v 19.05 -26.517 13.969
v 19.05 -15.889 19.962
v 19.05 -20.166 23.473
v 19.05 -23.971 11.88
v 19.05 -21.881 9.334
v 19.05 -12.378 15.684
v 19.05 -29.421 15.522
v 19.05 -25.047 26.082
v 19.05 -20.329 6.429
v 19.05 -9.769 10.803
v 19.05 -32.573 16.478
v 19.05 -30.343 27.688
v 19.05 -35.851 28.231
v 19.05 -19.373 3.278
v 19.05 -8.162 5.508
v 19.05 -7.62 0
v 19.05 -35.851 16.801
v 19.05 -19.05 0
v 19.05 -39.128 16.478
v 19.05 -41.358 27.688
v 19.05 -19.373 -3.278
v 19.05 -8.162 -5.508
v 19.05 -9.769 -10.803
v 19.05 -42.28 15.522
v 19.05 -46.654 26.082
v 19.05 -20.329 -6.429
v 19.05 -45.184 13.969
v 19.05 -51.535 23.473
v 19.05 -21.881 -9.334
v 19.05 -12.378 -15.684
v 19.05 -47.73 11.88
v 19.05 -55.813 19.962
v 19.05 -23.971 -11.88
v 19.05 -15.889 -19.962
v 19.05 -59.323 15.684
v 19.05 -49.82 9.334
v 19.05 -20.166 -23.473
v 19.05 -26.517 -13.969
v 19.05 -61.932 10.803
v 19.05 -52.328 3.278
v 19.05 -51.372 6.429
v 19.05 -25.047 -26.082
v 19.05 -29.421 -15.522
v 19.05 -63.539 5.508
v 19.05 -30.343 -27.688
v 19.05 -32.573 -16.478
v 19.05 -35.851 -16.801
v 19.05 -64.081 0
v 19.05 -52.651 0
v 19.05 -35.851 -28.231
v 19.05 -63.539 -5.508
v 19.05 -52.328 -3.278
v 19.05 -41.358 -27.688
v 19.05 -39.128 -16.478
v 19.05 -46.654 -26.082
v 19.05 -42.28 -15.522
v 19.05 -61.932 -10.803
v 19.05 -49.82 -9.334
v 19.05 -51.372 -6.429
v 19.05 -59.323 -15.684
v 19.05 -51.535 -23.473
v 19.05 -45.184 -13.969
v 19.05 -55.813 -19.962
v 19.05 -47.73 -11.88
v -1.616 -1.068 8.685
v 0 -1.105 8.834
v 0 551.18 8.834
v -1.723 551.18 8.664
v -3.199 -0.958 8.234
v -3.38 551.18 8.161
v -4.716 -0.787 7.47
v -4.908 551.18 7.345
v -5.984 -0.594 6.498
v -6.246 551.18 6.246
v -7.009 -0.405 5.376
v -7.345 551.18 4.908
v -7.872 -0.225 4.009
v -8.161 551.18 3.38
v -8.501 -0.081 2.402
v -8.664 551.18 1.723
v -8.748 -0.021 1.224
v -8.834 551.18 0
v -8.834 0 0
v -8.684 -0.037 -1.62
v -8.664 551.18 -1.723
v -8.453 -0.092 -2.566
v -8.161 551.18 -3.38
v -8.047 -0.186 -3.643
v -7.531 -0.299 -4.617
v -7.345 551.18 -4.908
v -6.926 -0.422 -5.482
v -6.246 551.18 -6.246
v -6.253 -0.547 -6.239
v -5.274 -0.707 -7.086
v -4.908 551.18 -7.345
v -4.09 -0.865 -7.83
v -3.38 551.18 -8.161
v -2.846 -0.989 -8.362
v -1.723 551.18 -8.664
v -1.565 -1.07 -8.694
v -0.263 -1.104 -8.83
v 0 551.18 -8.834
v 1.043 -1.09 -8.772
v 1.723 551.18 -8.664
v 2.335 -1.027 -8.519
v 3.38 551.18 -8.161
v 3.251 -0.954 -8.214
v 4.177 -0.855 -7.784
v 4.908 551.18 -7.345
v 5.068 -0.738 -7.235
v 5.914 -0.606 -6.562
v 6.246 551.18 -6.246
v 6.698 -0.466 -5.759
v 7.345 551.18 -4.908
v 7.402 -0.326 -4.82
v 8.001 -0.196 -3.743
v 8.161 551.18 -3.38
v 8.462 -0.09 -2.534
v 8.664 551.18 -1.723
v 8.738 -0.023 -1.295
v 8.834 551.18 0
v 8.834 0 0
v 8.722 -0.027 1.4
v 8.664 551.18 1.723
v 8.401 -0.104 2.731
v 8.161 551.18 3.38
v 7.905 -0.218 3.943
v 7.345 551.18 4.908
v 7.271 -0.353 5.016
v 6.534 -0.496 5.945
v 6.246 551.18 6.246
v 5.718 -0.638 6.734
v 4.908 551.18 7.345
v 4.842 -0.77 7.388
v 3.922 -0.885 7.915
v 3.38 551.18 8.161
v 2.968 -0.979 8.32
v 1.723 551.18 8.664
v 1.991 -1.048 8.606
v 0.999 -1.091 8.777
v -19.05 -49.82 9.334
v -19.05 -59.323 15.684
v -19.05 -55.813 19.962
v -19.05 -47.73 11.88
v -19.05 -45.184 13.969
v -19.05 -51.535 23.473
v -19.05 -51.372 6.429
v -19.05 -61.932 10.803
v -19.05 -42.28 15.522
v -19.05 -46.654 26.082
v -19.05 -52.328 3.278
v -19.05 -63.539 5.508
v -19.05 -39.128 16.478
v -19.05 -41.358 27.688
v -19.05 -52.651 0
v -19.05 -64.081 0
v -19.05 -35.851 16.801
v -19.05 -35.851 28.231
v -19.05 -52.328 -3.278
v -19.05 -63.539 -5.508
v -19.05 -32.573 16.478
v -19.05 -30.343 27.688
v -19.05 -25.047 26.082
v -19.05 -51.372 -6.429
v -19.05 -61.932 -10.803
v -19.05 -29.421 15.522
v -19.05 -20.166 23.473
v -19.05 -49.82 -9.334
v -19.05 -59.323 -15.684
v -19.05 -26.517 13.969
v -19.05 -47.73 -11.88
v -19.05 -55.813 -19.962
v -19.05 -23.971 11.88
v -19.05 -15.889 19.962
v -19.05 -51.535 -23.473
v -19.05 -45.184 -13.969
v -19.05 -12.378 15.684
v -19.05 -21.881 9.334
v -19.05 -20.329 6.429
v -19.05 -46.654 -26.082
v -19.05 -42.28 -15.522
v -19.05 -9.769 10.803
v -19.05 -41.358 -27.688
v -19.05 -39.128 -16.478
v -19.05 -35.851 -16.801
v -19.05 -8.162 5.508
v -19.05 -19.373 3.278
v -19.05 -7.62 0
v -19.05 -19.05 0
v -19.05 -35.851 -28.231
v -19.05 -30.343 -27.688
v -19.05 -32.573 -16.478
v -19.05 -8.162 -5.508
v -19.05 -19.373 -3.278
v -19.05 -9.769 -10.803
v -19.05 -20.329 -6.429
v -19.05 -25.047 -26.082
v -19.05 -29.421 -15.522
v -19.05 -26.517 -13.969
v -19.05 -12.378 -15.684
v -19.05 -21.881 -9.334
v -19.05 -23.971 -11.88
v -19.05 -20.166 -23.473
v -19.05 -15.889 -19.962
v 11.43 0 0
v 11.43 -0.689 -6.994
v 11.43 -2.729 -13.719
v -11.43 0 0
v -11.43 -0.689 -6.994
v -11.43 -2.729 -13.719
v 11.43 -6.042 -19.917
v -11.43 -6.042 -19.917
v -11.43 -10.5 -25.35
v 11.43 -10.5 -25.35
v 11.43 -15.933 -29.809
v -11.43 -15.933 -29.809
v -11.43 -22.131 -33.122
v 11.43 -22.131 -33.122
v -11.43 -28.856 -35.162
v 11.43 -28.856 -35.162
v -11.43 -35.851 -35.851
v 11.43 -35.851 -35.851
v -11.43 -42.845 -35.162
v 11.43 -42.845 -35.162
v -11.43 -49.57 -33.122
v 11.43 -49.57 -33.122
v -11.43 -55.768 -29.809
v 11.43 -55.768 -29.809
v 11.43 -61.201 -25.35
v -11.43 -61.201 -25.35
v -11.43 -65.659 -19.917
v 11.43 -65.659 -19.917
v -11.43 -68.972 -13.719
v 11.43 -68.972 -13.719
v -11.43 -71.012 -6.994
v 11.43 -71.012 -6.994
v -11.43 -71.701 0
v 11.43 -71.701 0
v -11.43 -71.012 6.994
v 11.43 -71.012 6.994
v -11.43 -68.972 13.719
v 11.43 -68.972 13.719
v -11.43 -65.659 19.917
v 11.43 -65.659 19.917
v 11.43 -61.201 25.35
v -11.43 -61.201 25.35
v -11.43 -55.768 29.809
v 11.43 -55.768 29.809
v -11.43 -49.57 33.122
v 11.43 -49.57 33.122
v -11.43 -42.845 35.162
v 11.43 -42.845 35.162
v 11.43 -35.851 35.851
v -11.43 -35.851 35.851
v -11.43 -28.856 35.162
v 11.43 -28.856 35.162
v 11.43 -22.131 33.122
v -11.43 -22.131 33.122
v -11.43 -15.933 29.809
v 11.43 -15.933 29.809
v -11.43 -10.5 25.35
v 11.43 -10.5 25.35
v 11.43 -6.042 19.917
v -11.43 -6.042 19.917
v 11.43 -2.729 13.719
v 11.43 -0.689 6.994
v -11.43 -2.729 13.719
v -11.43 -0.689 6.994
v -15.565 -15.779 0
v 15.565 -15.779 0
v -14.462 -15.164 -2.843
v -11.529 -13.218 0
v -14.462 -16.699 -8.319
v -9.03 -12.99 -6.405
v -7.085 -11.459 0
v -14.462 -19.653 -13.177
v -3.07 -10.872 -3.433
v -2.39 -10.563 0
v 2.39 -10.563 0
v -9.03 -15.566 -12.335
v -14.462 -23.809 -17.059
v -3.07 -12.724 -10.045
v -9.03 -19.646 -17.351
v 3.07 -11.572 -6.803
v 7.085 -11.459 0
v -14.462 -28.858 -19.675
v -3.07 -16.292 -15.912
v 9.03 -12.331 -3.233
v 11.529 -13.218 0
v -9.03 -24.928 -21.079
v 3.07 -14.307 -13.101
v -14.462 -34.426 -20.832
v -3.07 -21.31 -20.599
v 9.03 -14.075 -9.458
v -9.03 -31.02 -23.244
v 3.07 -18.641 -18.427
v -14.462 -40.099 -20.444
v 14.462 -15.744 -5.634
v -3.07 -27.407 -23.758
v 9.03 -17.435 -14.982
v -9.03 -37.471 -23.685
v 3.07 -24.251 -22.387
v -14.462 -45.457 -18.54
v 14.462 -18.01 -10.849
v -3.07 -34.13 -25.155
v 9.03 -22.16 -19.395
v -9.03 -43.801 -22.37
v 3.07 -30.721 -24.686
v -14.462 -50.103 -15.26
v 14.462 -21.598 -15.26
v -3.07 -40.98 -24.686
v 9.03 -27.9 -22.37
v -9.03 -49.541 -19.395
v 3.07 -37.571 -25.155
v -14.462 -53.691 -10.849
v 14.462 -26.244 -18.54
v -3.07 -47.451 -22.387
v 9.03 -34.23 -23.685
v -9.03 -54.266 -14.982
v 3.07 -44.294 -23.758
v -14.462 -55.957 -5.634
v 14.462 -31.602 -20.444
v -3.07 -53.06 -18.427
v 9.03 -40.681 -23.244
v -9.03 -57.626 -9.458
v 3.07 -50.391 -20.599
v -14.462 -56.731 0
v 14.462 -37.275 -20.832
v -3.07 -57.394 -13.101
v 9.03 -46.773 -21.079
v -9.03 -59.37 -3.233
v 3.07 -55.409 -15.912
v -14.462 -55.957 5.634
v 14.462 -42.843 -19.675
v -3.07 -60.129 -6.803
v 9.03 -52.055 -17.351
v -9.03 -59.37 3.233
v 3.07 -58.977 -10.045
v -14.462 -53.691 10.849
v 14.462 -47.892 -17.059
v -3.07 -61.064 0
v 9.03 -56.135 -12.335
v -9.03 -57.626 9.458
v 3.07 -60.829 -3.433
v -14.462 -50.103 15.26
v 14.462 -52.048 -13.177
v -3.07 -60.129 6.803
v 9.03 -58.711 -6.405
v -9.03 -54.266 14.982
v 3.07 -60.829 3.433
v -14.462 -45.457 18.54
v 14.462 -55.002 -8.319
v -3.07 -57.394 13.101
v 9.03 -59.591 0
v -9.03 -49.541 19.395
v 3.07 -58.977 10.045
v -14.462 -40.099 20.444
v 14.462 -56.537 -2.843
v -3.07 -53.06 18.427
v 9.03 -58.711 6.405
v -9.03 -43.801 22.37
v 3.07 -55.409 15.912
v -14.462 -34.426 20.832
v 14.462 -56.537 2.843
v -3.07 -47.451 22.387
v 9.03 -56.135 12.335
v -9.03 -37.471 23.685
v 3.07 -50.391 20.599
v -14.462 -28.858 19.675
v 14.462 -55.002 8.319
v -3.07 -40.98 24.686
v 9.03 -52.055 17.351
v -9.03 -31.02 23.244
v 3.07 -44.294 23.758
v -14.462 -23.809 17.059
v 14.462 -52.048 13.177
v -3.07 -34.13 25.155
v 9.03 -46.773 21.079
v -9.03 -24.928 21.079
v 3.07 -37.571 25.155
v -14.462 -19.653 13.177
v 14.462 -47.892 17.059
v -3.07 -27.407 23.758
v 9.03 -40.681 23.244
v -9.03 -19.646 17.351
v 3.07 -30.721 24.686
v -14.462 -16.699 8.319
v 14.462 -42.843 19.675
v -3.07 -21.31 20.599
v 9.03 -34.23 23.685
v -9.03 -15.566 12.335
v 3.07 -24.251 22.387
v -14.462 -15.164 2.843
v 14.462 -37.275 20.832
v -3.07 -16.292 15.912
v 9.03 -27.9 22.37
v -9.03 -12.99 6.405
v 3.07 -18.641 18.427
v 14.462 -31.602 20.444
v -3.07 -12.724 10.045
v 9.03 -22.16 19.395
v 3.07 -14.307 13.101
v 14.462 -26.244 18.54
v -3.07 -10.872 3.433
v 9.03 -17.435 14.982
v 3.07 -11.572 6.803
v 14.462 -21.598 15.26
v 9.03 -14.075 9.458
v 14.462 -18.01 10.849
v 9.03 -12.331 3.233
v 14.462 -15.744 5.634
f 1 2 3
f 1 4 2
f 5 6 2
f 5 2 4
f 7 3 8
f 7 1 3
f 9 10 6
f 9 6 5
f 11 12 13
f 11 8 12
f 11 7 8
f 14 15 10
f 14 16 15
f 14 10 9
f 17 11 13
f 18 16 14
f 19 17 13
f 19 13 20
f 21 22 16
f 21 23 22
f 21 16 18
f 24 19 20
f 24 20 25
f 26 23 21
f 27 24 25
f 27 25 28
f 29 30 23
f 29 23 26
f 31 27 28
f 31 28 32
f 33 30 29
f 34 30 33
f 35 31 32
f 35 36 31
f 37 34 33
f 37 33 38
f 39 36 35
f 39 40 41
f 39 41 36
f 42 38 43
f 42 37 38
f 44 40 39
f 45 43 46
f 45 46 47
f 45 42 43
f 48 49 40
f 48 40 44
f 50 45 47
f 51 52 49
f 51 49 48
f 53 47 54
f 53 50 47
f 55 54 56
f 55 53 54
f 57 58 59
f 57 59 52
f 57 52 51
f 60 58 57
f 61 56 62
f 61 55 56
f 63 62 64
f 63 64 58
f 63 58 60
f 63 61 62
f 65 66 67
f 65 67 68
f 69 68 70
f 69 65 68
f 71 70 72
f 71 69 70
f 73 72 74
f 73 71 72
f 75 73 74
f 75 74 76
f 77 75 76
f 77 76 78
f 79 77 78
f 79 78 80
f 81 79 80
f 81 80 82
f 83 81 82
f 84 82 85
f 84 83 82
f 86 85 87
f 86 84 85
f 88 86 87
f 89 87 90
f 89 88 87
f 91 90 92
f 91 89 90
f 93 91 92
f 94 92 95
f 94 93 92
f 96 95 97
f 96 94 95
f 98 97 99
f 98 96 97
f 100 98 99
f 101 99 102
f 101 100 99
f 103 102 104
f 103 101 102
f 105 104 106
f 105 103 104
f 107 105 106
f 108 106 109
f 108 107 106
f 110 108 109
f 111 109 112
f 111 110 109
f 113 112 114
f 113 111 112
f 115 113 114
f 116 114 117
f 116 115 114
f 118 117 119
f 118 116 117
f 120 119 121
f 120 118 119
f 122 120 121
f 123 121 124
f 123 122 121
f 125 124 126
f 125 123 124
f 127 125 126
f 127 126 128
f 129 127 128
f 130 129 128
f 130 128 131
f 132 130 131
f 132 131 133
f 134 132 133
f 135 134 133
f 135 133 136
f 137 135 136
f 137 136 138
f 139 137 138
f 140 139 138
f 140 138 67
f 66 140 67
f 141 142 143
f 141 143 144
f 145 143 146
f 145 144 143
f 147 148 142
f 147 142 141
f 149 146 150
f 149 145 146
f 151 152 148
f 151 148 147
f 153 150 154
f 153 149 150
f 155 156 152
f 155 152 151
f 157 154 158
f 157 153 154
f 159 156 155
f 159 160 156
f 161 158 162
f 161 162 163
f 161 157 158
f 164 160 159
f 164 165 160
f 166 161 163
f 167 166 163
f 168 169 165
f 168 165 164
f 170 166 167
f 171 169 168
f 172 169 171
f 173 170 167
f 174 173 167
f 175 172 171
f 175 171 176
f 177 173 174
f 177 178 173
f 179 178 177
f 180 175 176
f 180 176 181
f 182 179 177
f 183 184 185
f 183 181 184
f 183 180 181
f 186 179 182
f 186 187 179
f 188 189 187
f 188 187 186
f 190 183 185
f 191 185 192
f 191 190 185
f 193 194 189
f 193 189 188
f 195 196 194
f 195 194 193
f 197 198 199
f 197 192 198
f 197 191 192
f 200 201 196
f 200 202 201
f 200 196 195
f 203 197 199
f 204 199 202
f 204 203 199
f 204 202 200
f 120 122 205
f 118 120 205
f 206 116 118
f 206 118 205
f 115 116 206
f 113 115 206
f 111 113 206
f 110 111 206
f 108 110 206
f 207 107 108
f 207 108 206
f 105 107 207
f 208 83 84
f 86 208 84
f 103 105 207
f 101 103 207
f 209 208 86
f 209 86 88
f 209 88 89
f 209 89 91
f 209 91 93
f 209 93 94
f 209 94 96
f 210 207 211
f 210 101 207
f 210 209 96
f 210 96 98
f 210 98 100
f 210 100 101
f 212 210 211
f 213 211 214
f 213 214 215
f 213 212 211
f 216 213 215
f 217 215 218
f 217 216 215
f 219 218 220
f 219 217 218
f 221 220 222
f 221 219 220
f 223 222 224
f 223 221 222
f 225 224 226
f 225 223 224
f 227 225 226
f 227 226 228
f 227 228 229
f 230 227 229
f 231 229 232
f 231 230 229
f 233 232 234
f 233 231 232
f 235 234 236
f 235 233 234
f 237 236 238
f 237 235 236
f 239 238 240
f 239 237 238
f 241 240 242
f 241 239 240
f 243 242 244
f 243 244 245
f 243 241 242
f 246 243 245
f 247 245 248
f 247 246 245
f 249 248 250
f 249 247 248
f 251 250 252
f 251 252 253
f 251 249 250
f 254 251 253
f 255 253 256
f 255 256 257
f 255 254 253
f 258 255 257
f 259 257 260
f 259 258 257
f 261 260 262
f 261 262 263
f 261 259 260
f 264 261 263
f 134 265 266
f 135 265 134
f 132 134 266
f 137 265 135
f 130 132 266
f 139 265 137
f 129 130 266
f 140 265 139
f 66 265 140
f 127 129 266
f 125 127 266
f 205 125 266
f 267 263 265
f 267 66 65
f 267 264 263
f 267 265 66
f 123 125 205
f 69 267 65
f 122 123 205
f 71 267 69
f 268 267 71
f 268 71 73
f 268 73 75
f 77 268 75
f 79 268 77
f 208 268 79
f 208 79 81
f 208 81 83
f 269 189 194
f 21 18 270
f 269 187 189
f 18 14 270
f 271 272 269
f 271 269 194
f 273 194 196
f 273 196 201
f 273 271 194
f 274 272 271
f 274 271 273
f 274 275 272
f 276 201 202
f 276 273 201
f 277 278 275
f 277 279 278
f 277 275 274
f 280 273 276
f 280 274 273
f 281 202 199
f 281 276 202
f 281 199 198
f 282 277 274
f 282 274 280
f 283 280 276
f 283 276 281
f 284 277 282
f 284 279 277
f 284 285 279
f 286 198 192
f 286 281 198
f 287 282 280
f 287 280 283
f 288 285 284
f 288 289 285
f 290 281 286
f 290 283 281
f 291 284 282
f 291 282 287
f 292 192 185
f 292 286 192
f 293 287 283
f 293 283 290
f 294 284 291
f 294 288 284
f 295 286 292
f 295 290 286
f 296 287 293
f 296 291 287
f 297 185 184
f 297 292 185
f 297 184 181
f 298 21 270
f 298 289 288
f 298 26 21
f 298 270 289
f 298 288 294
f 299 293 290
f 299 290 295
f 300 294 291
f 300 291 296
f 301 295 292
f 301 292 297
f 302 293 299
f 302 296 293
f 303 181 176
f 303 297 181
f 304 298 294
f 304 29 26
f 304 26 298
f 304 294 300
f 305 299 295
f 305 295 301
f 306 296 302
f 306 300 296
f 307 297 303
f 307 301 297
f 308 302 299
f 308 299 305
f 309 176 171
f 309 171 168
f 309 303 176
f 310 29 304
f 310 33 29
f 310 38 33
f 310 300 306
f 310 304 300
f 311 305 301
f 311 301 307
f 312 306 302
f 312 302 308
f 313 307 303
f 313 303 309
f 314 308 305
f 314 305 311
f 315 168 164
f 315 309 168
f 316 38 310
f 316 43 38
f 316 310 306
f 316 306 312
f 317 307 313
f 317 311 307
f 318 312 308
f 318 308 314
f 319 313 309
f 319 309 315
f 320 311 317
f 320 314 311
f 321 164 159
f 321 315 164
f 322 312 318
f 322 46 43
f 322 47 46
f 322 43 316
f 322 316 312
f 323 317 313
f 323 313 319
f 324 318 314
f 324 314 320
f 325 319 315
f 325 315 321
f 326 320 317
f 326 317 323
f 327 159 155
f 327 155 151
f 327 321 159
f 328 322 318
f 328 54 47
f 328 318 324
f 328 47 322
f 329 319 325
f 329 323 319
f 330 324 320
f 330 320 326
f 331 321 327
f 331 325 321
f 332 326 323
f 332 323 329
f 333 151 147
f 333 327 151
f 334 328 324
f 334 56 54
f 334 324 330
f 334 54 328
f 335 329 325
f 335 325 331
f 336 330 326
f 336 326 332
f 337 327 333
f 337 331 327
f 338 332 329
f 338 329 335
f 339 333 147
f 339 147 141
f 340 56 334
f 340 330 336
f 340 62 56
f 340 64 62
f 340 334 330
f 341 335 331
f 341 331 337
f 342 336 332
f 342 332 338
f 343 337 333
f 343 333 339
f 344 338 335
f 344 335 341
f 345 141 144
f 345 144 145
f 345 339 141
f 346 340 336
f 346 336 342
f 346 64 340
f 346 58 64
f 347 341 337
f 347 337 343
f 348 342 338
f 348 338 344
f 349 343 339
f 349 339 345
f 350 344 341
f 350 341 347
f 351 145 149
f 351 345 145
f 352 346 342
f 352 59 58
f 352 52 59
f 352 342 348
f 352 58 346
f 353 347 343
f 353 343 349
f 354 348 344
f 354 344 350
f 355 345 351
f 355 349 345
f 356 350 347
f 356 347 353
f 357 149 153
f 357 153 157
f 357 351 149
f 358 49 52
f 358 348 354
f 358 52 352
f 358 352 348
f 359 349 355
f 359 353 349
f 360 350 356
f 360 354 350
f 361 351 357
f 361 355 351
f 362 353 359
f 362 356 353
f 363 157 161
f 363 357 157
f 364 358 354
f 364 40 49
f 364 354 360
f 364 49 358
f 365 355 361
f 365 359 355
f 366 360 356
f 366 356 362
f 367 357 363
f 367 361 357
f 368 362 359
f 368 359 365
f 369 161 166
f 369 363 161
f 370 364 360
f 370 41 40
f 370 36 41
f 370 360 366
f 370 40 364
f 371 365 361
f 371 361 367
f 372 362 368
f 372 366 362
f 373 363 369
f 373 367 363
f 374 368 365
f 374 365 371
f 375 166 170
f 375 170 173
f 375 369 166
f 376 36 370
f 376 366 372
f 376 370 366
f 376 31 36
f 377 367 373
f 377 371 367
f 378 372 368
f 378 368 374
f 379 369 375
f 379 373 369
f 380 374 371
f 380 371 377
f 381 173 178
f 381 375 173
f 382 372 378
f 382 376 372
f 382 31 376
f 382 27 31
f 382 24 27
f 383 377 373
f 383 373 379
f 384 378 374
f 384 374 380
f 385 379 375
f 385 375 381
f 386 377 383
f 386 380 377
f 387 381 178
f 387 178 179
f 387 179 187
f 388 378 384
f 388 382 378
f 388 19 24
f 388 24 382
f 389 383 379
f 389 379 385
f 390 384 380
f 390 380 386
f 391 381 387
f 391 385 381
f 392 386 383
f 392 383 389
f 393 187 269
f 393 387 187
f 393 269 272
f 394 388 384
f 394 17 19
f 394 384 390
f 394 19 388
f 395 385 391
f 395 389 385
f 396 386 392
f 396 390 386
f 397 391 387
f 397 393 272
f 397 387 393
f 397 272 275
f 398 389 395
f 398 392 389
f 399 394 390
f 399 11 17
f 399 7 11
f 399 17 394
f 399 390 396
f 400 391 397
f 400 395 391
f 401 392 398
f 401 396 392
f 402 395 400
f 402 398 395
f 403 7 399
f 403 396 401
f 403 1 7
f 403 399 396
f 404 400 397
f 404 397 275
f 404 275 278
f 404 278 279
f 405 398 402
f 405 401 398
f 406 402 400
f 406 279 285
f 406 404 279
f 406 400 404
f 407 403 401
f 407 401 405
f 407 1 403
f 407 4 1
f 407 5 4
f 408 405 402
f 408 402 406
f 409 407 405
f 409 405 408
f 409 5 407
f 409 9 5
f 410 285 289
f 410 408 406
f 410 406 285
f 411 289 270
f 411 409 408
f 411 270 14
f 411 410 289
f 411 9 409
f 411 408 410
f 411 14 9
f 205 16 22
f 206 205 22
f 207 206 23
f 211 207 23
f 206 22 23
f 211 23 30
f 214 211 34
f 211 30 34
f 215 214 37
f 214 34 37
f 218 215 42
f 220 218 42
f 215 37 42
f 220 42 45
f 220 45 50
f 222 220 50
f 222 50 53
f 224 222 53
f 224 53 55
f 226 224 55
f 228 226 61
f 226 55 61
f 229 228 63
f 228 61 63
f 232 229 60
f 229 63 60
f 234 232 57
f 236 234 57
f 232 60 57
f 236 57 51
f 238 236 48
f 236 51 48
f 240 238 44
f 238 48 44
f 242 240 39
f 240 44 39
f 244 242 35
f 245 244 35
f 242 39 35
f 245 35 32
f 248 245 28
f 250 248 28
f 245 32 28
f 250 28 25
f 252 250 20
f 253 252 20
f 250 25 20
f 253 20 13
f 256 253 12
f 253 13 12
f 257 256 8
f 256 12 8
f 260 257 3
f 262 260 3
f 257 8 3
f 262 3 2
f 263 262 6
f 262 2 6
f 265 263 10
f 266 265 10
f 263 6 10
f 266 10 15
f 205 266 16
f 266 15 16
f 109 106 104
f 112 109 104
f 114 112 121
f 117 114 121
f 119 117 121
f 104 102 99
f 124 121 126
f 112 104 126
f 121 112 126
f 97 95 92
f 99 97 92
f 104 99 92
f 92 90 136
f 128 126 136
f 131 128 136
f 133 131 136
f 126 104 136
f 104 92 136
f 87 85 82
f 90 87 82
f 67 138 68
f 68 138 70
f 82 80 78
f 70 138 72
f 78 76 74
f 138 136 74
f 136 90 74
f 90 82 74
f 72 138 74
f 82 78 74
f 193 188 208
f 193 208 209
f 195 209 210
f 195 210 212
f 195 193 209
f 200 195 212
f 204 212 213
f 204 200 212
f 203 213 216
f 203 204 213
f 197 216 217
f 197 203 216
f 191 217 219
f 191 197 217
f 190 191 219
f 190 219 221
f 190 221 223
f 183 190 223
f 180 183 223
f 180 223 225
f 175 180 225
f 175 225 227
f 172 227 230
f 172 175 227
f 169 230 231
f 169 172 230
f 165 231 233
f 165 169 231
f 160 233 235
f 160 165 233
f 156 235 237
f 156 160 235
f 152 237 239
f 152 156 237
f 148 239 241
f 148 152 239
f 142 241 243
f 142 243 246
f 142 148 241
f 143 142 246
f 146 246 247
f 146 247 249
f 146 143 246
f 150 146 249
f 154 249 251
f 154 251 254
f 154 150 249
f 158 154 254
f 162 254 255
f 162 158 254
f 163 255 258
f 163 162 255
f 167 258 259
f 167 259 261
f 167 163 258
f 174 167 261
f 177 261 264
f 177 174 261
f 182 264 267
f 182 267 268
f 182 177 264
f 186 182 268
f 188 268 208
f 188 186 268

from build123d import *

# Parameters (mm, degrees)
F3_R     = 8.8335869627
F4_DEPTH = 558.8
F5_SIZE  = 7.62
F6_ANGLE = 90


with BuildPart() as f1:
    # F0 (on Right) → F1 (revolve)
    with BuildSketch(Plane.YZ):
        with BuildLine():
            Line((0, -19.05), (0, 0))
            Line((0, 0), (0, 19.05))
            Line((0, 19.05), (-19.05, 19.05))
            ThreePointArc((-19.05, 19.05), (-10.4505208253, 0), (-19.05, -19.05))
            Line((-19.05, -19.05), (0, -19.05))
        make_face()
    revolve(axis=Axis((0, -35.8505208253, 12.1182259172), (0, 0, 1)))

    # F3 (on offset) → F4 (join)
    with BuildSketch(Plane.XZ.offset(7.62)):
        Circle(F3_R)
    extrude(amount=-F4_DEPTH)

    # F5
    f5_edges = [f1.edges().sort_by_distance(p)[0] for p in [
        (0, -71.701042, 19.05),
        (0, -71.701042, -19.05),
    ]]
    chamfer(f5_edges, length=F5_SIZE)


with BuildPart() as f1_1:
    # F6: moved
    add(f1.part.rotate(Axis((0, -7.62, 0), (0, -1, 0)), F6_ANGLE))


solid = f1_1.part
